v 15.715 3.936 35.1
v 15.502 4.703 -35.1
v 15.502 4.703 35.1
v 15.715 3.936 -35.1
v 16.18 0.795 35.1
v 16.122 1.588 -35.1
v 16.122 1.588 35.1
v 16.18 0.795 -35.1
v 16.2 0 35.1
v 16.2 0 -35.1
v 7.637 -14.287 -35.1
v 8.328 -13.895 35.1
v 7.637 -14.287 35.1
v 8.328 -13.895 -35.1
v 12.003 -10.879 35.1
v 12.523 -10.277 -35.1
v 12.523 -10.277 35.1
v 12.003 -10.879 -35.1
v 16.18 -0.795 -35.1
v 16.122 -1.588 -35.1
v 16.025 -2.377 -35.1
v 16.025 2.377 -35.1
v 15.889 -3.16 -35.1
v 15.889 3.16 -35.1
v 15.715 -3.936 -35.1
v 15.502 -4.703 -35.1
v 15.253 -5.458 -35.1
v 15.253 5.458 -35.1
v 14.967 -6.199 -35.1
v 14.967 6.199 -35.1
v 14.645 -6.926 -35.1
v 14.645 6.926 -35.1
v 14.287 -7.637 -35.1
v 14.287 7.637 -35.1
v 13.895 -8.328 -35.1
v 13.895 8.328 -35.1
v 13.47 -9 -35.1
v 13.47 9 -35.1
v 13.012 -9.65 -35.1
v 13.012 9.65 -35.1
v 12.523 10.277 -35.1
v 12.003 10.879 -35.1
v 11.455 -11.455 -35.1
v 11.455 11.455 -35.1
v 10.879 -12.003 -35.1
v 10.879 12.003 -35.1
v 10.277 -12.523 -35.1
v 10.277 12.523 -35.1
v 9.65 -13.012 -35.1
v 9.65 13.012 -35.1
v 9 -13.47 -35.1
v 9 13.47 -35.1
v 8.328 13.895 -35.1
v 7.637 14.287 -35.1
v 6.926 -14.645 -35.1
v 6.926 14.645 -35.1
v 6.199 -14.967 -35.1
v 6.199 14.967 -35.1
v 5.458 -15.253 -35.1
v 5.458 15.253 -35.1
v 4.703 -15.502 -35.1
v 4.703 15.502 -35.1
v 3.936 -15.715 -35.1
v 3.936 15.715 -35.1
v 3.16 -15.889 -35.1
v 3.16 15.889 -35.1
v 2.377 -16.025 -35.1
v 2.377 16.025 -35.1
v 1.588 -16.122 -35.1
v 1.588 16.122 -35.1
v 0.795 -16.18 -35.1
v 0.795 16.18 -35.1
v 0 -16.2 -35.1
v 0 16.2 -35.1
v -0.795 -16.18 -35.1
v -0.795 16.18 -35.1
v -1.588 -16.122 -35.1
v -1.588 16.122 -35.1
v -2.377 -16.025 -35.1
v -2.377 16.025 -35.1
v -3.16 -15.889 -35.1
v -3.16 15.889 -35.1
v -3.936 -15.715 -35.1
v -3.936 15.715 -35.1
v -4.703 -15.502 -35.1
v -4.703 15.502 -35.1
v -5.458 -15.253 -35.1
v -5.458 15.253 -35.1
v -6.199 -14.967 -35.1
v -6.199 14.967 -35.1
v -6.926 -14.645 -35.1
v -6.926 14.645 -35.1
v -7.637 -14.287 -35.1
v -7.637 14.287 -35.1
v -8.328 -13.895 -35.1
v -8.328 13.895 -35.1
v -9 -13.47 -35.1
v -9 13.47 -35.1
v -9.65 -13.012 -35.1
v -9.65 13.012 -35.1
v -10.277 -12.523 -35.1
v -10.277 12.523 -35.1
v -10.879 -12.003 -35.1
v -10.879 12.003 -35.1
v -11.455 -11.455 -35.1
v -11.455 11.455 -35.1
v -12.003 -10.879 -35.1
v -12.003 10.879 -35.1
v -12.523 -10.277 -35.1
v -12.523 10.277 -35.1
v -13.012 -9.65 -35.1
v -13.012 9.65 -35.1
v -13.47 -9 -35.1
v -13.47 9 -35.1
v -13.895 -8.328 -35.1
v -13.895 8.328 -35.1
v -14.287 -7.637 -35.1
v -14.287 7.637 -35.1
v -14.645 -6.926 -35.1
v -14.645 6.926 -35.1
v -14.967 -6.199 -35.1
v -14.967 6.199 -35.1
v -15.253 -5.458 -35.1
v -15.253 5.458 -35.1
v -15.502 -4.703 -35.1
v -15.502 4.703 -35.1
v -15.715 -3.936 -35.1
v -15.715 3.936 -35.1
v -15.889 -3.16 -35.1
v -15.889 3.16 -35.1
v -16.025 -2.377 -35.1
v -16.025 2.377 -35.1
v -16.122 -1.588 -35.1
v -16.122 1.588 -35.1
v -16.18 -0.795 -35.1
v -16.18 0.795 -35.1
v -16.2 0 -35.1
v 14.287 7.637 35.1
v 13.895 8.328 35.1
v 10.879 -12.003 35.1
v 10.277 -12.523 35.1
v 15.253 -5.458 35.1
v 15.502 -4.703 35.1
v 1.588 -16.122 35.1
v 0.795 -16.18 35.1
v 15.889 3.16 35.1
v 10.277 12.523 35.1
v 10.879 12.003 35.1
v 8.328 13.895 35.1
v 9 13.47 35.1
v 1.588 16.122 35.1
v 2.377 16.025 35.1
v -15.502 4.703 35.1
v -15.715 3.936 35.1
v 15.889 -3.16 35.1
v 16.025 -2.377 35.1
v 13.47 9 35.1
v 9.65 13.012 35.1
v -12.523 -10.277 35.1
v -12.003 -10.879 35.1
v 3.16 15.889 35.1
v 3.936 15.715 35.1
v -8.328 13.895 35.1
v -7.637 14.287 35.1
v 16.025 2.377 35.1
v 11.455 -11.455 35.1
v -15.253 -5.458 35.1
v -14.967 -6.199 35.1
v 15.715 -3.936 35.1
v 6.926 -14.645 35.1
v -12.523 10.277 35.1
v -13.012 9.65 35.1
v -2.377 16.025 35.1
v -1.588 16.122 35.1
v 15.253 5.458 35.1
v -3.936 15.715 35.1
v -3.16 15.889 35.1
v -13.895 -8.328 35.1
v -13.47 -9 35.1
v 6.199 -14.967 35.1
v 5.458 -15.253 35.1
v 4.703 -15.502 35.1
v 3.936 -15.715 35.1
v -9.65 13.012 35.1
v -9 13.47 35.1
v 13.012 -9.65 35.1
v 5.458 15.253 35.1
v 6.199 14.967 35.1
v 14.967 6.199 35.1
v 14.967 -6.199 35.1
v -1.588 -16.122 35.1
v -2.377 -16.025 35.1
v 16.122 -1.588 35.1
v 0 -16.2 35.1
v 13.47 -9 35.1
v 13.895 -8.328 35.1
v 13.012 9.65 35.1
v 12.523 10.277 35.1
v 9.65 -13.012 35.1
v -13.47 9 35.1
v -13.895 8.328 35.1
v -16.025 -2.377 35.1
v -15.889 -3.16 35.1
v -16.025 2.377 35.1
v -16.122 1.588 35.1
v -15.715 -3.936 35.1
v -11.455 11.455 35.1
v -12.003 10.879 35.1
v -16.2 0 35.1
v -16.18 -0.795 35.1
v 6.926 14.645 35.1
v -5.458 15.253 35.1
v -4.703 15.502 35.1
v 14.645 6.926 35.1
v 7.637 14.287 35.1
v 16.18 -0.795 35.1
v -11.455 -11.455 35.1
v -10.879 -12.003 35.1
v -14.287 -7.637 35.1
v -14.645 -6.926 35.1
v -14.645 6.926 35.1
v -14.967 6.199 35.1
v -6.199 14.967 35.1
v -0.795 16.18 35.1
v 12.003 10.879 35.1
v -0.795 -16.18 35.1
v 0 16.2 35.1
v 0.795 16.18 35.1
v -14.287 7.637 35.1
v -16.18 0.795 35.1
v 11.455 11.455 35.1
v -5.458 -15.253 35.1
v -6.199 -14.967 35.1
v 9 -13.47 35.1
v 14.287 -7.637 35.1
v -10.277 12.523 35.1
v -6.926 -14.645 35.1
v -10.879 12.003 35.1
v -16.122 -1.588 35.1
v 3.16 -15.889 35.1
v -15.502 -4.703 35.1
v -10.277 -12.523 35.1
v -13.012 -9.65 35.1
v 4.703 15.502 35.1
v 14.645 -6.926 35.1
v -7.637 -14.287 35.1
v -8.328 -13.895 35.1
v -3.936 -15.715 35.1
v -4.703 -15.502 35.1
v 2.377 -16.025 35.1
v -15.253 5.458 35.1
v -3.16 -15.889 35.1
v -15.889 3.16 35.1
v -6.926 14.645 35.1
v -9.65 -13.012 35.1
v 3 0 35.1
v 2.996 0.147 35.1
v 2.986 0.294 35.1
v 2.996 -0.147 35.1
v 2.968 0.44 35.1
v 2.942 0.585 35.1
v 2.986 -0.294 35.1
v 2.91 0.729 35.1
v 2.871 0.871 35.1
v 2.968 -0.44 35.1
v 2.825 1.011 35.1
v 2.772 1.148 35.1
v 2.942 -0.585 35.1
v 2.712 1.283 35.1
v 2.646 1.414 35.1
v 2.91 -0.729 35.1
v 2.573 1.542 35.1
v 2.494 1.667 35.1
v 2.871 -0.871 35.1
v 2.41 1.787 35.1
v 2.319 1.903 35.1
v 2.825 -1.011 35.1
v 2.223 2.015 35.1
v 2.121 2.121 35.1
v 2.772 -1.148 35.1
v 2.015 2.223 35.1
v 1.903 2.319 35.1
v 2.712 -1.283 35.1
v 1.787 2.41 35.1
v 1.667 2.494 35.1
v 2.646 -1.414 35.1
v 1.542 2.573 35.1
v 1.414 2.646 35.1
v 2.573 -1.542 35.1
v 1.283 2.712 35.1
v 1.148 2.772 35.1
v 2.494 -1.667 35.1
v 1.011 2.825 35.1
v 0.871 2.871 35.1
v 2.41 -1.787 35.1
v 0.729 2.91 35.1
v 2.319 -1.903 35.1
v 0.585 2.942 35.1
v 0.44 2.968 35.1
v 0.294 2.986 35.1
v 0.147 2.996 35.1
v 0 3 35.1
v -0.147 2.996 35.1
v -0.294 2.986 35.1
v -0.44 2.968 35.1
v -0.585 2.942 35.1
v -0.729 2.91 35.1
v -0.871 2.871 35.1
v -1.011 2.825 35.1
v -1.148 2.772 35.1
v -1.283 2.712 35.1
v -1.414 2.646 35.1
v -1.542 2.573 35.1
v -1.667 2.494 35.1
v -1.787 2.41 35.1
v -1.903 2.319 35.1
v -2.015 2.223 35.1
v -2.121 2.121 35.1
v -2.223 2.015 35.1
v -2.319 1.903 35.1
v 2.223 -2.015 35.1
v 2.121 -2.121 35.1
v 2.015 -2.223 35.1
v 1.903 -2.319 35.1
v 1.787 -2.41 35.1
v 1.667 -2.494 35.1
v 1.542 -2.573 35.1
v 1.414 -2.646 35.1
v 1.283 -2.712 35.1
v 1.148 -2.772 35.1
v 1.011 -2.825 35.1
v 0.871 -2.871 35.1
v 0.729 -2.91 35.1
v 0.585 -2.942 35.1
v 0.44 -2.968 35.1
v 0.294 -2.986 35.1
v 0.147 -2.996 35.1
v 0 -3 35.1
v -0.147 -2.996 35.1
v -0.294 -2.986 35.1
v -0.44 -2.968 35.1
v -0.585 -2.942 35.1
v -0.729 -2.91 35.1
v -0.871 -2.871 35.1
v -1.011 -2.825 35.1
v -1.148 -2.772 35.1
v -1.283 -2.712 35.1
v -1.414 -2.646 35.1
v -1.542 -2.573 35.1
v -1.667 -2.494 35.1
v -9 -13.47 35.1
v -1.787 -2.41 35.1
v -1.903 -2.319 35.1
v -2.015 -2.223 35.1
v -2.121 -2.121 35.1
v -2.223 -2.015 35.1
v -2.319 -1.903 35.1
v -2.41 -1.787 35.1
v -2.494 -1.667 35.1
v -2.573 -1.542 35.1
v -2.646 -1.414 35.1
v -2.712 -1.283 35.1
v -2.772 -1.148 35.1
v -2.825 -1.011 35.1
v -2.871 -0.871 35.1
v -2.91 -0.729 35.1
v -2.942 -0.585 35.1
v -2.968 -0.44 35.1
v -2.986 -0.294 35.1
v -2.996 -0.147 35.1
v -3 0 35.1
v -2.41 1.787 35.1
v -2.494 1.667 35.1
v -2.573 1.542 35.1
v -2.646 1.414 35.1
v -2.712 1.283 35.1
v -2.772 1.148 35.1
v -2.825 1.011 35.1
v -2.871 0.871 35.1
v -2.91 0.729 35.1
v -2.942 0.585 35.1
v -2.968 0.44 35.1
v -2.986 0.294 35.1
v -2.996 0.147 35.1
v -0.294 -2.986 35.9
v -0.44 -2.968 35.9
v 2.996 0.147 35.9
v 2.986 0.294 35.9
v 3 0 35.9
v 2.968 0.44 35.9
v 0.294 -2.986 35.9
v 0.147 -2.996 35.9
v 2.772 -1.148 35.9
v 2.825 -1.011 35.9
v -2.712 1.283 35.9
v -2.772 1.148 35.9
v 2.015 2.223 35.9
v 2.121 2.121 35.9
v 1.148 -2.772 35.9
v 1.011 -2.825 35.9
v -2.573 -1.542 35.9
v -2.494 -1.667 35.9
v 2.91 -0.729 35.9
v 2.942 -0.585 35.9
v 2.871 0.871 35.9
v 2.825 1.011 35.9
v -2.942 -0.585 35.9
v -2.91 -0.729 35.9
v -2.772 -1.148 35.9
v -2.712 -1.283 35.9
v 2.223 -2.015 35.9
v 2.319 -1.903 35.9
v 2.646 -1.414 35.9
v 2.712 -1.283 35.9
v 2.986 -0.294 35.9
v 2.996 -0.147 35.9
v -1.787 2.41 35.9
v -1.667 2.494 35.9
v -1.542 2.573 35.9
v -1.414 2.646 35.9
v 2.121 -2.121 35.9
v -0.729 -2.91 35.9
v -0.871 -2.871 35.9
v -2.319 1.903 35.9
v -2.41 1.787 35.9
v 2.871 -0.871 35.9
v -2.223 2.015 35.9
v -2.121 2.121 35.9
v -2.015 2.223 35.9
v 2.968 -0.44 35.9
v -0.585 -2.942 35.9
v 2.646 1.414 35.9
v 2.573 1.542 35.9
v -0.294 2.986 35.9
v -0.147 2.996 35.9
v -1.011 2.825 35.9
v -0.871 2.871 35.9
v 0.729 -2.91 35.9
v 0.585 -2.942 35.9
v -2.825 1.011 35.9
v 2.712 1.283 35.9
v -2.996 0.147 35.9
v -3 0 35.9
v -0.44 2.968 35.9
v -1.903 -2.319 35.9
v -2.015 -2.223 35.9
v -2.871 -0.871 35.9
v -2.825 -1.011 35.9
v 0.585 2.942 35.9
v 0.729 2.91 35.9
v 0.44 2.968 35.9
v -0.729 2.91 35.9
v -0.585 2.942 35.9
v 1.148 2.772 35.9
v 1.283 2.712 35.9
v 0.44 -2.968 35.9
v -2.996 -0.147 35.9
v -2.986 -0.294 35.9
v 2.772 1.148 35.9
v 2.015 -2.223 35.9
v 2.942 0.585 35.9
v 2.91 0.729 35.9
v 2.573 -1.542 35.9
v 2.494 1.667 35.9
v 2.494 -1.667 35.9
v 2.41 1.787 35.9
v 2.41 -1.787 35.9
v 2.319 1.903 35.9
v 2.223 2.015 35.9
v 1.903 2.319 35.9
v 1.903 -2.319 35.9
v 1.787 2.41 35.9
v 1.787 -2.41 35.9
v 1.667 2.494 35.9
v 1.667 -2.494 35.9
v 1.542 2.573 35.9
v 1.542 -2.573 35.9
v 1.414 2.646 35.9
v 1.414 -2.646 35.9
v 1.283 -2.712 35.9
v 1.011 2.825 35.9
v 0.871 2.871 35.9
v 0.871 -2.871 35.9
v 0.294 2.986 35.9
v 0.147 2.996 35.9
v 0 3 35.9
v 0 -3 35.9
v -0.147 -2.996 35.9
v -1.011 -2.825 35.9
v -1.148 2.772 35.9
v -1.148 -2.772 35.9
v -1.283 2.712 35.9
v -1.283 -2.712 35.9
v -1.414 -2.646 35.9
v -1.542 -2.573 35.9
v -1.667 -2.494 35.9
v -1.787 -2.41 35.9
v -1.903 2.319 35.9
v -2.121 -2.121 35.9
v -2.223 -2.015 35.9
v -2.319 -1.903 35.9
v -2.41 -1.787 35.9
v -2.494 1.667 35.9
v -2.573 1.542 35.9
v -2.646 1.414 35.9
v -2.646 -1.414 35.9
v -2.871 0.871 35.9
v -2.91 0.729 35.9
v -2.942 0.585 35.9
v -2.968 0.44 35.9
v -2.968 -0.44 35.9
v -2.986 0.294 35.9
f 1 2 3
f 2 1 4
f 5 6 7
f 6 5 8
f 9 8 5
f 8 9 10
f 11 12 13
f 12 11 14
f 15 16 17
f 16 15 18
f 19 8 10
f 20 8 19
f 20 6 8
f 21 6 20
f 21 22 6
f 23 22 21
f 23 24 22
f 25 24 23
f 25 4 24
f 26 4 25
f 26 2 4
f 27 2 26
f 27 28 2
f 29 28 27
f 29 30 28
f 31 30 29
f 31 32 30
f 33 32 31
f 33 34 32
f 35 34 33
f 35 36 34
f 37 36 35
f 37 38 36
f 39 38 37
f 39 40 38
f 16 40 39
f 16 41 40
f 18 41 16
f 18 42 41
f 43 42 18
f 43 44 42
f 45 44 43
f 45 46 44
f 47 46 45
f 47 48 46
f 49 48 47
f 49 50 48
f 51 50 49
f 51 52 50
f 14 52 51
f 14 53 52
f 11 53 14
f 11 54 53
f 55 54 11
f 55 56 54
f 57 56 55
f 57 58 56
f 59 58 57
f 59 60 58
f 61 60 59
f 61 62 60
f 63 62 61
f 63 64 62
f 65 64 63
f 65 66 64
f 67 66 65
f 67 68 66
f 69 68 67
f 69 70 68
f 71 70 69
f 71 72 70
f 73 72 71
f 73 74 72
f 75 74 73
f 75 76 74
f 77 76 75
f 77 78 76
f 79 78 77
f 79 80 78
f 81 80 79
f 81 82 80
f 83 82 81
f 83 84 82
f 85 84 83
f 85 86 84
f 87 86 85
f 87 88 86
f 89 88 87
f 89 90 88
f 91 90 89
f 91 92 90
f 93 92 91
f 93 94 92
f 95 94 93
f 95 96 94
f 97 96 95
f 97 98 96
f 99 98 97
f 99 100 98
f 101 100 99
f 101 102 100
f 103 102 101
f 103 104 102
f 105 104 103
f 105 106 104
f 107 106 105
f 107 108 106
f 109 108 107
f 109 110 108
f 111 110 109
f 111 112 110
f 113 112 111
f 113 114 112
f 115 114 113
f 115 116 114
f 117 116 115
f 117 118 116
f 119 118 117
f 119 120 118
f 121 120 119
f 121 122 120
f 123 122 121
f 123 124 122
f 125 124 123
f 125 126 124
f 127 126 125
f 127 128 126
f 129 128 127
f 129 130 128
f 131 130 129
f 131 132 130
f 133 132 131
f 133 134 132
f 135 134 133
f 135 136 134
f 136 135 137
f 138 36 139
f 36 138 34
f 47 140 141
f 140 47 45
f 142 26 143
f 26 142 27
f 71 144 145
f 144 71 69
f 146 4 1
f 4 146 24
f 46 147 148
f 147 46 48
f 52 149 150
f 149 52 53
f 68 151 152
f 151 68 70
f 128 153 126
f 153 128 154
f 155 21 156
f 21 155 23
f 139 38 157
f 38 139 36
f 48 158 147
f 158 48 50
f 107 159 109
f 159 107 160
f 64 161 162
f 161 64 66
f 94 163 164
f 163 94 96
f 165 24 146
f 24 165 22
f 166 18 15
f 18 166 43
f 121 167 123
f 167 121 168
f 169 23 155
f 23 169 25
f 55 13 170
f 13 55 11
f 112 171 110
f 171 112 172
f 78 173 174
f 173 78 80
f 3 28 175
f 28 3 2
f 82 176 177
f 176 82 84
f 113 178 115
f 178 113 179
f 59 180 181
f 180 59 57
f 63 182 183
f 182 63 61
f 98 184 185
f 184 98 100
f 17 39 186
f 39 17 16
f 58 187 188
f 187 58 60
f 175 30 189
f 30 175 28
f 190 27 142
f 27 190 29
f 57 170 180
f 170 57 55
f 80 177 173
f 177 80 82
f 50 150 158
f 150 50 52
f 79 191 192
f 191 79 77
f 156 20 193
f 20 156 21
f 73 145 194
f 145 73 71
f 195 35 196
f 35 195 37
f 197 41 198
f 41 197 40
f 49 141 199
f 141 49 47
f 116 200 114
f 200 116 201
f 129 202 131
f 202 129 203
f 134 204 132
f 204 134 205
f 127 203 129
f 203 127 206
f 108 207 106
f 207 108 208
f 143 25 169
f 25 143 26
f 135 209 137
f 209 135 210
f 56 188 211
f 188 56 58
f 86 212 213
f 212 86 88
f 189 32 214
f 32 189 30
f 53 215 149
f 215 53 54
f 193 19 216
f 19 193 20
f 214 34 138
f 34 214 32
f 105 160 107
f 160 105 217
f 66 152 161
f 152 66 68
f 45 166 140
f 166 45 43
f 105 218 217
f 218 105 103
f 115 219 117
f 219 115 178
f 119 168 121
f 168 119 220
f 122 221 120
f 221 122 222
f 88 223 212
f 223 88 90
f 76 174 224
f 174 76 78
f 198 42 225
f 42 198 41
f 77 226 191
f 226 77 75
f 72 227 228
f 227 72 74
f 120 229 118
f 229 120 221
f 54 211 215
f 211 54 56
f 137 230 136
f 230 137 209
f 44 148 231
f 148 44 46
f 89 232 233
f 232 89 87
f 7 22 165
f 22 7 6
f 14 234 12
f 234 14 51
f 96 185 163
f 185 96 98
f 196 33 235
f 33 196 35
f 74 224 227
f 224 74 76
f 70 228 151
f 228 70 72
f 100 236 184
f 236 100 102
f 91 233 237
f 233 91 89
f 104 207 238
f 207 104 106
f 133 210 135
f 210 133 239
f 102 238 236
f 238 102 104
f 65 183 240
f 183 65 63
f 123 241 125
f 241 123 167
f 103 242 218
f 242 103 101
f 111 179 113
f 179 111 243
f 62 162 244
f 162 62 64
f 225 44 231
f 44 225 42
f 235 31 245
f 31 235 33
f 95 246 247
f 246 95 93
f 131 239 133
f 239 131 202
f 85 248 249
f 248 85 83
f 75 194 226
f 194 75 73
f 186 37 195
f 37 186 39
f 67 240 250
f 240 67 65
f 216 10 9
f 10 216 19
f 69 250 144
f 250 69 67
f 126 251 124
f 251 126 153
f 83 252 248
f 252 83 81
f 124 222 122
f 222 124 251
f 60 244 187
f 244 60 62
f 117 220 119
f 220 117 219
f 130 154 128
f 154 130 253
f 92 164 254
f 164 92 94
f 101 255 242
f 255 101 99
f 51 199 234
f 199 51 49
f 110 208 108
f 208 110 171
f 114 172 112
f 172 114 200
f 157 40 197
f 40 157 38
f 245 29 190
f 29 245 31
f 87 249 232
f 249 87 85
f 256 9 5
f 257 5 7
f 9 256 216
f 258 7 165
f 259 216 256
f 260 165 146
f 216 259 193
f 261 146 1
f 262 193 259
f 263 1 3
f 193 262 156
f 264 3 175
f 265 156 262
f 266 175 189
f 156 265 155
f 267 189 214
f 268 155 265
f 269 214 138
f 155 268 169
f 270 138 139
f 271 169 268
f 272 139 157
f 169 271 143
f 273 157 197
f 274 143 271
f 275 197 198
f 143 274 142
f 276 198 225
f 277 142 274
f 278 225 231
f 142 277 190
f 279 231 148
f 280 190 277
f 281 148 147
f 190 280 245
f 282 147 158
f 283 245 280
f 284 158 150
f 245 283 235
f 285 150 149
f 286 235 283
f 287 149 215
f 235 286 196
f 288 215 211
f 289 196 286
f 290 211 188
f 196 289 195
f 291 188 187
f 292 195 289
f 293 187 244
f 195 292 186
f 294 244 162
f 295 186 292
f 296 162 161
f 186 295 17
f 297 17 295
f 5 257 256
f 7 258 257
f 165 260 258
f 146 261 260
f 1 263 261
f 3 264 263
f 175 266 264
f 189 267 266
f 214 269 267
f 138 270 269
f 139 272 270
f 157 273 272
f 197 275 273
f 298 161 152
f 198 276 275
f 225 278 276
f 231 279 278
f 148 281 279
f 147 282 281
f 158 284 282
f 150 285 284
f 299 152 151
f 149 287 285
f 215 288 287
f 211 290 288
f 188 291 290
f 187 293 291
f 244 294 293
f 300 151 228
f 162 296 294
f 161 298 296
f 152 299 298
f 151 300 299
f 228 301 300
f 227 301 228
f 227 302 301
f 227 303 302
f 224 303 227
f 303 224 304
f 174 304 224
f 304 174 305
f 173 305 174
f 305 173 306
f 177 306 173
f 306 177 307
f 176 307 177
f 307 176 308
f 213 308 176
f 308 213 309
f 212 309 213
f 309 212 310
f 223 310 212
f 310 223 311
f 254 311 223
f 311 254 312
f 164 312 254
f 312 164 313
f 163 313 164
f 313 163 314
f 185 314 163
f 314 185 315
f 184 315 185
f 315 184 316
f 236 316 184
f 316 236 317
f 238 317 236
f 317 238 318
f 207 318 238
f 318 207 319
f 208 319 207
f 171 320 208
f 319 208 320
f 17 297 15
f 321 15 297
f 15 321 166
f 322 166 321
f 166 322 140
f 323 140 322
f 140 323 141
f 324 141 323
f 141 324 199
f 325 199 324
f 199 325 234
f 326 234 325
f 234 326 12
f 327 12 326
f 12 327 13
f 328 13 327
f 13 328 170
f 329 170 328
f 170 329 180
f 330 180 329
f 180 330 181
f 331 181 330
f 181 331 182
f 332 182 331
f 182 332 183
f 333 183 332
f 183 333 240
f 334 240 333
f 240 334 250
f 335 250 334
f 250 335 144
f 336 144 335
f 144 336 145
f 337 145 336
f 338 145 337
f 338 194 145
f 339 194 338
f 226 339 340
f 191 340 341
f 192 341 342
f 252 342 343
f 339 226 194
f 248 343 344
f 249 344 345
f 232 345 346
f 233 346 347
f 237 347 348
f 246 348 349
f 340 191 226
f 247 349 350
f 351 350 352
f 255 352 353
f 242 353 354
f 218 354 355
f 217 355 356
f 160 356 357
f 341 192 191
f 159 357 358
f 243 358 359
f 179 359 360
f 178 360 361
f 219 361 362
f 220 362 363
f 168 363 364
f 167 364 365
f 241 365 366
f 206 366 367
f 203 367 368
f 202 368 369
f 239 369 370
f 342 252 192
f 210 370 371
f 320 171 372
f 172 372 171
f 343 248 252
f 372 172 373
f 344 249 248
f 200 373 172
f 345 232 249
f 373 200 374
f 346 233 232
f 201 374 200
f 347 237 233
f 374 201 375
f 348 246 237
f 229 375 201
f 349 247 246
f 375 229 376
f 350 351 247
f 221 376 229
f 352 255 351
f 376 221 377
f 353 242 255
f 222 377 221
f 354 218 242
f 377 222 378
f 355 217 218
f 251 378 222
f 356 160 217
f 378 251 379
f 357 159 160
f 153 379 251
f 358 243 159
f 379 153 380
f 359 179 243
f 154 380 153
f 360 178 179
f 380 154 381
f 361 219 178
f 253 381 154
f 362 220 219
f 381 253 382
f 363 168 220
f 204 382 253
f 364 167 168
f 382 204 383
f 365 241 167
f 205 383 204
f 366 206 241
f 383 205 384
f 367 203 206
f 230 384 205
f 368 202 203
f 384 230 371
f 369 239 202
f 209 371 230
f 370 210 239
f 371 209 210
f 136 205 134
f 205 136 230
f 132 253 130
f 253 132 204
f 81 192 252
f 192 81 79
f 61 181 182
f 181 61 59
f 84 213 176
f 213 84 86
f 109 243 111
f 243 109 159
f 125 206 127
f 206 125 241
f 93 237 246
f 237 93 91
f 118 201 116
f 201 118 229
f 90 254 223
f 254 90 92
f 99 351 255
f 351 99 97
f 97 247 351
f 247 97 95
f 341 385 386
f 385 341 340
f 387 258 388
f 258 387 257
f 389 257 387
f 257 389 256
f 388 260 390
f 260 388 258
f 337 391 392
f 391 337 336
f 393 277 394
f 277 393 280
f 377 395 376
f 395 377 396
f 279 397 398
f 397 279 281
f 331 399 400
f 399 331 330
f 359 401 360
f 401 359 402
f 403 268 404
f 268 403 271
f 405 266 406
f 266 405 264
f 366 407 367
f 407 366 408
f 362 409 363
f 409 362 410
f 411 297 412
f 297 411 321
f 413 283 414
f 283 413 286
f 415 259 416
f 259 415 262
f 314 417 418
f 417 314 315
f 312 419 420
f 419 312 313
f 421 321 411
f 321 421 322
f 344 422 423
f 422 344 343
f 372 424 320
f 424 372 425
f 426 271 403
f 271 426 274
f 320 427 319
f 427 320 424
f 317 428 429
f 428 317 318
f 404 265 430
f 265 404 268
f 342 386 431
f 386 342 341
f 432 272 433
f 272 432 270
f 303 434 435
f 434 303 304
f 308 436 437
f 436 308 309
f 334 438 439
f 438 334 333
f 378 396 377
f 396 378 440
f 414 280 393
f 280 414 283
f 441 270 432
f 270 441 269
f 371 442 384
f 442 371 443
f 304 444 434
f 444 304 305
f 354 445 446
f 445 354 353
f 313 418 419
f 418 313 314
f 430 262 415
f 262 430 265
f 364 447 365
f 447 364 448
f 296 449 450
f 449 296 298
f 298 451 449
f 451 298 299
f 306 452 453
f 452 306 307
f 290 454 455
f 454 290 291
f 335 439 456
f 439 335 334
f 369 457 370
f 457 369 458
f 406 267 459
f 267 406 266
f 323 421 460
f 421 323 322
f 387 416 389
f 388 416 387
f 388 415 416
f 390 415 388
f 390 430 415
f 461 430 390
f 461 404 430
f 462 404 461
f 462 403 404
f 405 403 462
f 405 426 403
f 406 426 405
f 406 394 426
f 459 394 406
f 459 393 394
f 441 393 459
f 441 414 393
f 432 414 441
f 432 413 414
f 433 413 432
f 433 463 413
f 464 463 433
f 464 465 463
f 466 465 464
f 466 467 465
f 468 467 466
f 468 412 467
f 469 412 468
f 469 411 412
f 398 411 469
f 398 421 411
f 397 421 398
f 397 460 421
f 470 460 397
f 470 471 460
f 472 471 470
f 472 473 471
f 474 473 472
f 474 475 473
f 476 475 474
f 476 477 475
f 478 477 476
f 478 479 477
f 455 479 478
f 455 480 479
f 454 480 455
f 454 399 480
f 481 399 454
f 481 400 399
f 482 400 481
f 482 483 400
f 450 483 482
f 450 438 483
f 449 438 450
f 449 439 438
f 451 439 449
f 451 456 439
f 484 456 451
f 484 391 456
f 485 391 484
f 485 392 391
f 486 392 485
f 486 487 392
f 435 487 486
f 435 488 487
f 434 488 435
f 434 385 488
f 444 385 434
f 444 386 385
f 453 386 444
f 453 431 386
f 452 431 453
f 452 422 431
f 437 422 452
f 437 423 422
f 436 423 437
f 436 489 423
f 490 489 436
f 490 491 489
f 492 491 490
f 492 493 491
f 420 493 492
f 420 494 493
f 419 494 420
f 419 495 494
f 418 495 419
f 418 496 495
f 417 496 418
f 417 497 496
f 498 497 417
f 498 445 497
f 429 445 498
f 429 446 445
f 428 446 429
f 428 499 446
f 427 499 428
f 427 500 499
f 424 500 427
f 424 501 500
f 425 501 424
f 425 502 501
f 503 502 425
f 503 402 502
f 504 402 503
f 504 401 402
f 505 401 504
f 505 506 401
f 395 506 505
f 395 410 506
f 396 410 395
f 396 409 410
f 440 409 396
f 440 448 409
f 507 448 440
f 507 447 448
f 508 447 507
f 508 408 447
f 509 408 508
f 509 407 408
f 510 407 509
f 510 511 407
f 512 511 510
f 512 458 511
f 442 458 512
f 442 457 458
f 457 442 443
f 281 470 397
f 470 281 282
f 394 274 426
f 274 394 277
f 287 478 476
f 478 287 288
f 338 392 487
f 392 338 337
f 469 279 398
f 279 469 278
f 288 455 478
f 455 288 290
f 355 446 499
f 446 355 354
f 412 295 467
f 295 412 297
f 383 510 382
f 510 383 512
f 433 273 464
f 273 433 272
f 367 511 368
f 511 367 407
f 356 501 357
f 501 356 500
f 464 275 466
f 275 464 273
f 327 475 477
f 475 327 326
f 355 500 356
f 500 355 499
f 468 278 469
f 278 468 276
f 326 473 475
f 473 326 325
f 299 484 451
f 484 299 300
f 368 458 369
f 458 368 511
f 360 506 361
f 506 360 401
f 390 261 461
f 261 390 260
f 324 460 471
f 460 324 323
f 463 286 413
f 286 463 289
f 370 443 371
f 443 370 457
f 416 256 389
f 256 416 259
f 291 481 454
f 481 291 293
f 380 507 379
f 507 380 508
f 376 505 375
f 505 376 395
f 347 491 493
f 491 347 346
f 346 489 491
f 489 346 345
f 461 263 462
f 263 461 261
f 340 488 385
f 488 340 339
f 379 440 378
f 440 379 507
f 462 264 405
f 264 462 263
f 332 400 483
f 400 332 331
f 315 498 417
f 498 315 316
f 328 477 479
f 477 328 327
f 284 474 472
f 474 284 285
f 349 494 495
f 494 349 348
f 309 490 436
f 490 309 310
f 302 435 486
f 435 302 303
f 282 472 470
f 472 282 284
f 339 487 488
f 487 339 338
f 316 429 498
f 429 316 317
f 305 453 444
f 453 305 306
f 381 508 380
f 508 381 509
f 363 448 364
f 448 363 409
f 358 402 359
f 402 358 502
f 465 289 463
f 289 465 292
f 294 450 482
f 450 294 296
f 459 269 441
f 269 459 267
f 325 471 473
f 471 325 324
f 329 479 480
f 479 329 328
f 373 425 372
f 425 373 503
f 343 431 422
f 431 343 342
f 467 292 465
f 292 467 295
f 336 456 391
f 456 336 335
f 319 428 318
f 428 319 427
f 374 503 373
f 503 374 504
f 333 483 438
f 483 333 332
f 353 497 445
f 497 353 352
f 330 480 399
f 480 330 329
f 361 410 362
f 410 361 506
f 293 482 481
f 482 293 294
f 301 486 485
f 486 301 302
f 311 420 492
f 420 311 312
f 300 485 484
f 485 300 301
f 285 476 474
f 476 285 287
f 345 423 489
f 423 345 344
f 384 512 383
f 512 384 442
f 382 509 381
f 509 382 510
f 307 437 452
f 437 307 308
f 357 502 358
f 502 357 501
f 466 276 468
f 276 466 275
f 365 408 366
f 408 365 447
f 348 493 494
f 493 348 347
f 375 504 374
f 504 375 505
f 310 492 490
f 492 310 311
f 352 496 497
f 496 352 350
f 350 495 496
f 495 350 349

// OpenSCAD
$fn=128;

cell_h = 70.2;
cell_d = 32.4;

cap_h = 1.6;
cap_d = 14.0;
button_h = 0.8;
button_d = 6.0;

module battery_cell(h=cell_h, d=cell_d) {
    union() {
        cylinder(h=h, d=d, center=true);
        translate([0,0,h/2 - cap_h/2])
            cylinder(h=cap_h, d=cap_d, center=true);
        translate([0,0,h/2 + button_h/2])
            cylinder(h=button_h, d=button_d, center=true);
    }
}

battery_cell();
